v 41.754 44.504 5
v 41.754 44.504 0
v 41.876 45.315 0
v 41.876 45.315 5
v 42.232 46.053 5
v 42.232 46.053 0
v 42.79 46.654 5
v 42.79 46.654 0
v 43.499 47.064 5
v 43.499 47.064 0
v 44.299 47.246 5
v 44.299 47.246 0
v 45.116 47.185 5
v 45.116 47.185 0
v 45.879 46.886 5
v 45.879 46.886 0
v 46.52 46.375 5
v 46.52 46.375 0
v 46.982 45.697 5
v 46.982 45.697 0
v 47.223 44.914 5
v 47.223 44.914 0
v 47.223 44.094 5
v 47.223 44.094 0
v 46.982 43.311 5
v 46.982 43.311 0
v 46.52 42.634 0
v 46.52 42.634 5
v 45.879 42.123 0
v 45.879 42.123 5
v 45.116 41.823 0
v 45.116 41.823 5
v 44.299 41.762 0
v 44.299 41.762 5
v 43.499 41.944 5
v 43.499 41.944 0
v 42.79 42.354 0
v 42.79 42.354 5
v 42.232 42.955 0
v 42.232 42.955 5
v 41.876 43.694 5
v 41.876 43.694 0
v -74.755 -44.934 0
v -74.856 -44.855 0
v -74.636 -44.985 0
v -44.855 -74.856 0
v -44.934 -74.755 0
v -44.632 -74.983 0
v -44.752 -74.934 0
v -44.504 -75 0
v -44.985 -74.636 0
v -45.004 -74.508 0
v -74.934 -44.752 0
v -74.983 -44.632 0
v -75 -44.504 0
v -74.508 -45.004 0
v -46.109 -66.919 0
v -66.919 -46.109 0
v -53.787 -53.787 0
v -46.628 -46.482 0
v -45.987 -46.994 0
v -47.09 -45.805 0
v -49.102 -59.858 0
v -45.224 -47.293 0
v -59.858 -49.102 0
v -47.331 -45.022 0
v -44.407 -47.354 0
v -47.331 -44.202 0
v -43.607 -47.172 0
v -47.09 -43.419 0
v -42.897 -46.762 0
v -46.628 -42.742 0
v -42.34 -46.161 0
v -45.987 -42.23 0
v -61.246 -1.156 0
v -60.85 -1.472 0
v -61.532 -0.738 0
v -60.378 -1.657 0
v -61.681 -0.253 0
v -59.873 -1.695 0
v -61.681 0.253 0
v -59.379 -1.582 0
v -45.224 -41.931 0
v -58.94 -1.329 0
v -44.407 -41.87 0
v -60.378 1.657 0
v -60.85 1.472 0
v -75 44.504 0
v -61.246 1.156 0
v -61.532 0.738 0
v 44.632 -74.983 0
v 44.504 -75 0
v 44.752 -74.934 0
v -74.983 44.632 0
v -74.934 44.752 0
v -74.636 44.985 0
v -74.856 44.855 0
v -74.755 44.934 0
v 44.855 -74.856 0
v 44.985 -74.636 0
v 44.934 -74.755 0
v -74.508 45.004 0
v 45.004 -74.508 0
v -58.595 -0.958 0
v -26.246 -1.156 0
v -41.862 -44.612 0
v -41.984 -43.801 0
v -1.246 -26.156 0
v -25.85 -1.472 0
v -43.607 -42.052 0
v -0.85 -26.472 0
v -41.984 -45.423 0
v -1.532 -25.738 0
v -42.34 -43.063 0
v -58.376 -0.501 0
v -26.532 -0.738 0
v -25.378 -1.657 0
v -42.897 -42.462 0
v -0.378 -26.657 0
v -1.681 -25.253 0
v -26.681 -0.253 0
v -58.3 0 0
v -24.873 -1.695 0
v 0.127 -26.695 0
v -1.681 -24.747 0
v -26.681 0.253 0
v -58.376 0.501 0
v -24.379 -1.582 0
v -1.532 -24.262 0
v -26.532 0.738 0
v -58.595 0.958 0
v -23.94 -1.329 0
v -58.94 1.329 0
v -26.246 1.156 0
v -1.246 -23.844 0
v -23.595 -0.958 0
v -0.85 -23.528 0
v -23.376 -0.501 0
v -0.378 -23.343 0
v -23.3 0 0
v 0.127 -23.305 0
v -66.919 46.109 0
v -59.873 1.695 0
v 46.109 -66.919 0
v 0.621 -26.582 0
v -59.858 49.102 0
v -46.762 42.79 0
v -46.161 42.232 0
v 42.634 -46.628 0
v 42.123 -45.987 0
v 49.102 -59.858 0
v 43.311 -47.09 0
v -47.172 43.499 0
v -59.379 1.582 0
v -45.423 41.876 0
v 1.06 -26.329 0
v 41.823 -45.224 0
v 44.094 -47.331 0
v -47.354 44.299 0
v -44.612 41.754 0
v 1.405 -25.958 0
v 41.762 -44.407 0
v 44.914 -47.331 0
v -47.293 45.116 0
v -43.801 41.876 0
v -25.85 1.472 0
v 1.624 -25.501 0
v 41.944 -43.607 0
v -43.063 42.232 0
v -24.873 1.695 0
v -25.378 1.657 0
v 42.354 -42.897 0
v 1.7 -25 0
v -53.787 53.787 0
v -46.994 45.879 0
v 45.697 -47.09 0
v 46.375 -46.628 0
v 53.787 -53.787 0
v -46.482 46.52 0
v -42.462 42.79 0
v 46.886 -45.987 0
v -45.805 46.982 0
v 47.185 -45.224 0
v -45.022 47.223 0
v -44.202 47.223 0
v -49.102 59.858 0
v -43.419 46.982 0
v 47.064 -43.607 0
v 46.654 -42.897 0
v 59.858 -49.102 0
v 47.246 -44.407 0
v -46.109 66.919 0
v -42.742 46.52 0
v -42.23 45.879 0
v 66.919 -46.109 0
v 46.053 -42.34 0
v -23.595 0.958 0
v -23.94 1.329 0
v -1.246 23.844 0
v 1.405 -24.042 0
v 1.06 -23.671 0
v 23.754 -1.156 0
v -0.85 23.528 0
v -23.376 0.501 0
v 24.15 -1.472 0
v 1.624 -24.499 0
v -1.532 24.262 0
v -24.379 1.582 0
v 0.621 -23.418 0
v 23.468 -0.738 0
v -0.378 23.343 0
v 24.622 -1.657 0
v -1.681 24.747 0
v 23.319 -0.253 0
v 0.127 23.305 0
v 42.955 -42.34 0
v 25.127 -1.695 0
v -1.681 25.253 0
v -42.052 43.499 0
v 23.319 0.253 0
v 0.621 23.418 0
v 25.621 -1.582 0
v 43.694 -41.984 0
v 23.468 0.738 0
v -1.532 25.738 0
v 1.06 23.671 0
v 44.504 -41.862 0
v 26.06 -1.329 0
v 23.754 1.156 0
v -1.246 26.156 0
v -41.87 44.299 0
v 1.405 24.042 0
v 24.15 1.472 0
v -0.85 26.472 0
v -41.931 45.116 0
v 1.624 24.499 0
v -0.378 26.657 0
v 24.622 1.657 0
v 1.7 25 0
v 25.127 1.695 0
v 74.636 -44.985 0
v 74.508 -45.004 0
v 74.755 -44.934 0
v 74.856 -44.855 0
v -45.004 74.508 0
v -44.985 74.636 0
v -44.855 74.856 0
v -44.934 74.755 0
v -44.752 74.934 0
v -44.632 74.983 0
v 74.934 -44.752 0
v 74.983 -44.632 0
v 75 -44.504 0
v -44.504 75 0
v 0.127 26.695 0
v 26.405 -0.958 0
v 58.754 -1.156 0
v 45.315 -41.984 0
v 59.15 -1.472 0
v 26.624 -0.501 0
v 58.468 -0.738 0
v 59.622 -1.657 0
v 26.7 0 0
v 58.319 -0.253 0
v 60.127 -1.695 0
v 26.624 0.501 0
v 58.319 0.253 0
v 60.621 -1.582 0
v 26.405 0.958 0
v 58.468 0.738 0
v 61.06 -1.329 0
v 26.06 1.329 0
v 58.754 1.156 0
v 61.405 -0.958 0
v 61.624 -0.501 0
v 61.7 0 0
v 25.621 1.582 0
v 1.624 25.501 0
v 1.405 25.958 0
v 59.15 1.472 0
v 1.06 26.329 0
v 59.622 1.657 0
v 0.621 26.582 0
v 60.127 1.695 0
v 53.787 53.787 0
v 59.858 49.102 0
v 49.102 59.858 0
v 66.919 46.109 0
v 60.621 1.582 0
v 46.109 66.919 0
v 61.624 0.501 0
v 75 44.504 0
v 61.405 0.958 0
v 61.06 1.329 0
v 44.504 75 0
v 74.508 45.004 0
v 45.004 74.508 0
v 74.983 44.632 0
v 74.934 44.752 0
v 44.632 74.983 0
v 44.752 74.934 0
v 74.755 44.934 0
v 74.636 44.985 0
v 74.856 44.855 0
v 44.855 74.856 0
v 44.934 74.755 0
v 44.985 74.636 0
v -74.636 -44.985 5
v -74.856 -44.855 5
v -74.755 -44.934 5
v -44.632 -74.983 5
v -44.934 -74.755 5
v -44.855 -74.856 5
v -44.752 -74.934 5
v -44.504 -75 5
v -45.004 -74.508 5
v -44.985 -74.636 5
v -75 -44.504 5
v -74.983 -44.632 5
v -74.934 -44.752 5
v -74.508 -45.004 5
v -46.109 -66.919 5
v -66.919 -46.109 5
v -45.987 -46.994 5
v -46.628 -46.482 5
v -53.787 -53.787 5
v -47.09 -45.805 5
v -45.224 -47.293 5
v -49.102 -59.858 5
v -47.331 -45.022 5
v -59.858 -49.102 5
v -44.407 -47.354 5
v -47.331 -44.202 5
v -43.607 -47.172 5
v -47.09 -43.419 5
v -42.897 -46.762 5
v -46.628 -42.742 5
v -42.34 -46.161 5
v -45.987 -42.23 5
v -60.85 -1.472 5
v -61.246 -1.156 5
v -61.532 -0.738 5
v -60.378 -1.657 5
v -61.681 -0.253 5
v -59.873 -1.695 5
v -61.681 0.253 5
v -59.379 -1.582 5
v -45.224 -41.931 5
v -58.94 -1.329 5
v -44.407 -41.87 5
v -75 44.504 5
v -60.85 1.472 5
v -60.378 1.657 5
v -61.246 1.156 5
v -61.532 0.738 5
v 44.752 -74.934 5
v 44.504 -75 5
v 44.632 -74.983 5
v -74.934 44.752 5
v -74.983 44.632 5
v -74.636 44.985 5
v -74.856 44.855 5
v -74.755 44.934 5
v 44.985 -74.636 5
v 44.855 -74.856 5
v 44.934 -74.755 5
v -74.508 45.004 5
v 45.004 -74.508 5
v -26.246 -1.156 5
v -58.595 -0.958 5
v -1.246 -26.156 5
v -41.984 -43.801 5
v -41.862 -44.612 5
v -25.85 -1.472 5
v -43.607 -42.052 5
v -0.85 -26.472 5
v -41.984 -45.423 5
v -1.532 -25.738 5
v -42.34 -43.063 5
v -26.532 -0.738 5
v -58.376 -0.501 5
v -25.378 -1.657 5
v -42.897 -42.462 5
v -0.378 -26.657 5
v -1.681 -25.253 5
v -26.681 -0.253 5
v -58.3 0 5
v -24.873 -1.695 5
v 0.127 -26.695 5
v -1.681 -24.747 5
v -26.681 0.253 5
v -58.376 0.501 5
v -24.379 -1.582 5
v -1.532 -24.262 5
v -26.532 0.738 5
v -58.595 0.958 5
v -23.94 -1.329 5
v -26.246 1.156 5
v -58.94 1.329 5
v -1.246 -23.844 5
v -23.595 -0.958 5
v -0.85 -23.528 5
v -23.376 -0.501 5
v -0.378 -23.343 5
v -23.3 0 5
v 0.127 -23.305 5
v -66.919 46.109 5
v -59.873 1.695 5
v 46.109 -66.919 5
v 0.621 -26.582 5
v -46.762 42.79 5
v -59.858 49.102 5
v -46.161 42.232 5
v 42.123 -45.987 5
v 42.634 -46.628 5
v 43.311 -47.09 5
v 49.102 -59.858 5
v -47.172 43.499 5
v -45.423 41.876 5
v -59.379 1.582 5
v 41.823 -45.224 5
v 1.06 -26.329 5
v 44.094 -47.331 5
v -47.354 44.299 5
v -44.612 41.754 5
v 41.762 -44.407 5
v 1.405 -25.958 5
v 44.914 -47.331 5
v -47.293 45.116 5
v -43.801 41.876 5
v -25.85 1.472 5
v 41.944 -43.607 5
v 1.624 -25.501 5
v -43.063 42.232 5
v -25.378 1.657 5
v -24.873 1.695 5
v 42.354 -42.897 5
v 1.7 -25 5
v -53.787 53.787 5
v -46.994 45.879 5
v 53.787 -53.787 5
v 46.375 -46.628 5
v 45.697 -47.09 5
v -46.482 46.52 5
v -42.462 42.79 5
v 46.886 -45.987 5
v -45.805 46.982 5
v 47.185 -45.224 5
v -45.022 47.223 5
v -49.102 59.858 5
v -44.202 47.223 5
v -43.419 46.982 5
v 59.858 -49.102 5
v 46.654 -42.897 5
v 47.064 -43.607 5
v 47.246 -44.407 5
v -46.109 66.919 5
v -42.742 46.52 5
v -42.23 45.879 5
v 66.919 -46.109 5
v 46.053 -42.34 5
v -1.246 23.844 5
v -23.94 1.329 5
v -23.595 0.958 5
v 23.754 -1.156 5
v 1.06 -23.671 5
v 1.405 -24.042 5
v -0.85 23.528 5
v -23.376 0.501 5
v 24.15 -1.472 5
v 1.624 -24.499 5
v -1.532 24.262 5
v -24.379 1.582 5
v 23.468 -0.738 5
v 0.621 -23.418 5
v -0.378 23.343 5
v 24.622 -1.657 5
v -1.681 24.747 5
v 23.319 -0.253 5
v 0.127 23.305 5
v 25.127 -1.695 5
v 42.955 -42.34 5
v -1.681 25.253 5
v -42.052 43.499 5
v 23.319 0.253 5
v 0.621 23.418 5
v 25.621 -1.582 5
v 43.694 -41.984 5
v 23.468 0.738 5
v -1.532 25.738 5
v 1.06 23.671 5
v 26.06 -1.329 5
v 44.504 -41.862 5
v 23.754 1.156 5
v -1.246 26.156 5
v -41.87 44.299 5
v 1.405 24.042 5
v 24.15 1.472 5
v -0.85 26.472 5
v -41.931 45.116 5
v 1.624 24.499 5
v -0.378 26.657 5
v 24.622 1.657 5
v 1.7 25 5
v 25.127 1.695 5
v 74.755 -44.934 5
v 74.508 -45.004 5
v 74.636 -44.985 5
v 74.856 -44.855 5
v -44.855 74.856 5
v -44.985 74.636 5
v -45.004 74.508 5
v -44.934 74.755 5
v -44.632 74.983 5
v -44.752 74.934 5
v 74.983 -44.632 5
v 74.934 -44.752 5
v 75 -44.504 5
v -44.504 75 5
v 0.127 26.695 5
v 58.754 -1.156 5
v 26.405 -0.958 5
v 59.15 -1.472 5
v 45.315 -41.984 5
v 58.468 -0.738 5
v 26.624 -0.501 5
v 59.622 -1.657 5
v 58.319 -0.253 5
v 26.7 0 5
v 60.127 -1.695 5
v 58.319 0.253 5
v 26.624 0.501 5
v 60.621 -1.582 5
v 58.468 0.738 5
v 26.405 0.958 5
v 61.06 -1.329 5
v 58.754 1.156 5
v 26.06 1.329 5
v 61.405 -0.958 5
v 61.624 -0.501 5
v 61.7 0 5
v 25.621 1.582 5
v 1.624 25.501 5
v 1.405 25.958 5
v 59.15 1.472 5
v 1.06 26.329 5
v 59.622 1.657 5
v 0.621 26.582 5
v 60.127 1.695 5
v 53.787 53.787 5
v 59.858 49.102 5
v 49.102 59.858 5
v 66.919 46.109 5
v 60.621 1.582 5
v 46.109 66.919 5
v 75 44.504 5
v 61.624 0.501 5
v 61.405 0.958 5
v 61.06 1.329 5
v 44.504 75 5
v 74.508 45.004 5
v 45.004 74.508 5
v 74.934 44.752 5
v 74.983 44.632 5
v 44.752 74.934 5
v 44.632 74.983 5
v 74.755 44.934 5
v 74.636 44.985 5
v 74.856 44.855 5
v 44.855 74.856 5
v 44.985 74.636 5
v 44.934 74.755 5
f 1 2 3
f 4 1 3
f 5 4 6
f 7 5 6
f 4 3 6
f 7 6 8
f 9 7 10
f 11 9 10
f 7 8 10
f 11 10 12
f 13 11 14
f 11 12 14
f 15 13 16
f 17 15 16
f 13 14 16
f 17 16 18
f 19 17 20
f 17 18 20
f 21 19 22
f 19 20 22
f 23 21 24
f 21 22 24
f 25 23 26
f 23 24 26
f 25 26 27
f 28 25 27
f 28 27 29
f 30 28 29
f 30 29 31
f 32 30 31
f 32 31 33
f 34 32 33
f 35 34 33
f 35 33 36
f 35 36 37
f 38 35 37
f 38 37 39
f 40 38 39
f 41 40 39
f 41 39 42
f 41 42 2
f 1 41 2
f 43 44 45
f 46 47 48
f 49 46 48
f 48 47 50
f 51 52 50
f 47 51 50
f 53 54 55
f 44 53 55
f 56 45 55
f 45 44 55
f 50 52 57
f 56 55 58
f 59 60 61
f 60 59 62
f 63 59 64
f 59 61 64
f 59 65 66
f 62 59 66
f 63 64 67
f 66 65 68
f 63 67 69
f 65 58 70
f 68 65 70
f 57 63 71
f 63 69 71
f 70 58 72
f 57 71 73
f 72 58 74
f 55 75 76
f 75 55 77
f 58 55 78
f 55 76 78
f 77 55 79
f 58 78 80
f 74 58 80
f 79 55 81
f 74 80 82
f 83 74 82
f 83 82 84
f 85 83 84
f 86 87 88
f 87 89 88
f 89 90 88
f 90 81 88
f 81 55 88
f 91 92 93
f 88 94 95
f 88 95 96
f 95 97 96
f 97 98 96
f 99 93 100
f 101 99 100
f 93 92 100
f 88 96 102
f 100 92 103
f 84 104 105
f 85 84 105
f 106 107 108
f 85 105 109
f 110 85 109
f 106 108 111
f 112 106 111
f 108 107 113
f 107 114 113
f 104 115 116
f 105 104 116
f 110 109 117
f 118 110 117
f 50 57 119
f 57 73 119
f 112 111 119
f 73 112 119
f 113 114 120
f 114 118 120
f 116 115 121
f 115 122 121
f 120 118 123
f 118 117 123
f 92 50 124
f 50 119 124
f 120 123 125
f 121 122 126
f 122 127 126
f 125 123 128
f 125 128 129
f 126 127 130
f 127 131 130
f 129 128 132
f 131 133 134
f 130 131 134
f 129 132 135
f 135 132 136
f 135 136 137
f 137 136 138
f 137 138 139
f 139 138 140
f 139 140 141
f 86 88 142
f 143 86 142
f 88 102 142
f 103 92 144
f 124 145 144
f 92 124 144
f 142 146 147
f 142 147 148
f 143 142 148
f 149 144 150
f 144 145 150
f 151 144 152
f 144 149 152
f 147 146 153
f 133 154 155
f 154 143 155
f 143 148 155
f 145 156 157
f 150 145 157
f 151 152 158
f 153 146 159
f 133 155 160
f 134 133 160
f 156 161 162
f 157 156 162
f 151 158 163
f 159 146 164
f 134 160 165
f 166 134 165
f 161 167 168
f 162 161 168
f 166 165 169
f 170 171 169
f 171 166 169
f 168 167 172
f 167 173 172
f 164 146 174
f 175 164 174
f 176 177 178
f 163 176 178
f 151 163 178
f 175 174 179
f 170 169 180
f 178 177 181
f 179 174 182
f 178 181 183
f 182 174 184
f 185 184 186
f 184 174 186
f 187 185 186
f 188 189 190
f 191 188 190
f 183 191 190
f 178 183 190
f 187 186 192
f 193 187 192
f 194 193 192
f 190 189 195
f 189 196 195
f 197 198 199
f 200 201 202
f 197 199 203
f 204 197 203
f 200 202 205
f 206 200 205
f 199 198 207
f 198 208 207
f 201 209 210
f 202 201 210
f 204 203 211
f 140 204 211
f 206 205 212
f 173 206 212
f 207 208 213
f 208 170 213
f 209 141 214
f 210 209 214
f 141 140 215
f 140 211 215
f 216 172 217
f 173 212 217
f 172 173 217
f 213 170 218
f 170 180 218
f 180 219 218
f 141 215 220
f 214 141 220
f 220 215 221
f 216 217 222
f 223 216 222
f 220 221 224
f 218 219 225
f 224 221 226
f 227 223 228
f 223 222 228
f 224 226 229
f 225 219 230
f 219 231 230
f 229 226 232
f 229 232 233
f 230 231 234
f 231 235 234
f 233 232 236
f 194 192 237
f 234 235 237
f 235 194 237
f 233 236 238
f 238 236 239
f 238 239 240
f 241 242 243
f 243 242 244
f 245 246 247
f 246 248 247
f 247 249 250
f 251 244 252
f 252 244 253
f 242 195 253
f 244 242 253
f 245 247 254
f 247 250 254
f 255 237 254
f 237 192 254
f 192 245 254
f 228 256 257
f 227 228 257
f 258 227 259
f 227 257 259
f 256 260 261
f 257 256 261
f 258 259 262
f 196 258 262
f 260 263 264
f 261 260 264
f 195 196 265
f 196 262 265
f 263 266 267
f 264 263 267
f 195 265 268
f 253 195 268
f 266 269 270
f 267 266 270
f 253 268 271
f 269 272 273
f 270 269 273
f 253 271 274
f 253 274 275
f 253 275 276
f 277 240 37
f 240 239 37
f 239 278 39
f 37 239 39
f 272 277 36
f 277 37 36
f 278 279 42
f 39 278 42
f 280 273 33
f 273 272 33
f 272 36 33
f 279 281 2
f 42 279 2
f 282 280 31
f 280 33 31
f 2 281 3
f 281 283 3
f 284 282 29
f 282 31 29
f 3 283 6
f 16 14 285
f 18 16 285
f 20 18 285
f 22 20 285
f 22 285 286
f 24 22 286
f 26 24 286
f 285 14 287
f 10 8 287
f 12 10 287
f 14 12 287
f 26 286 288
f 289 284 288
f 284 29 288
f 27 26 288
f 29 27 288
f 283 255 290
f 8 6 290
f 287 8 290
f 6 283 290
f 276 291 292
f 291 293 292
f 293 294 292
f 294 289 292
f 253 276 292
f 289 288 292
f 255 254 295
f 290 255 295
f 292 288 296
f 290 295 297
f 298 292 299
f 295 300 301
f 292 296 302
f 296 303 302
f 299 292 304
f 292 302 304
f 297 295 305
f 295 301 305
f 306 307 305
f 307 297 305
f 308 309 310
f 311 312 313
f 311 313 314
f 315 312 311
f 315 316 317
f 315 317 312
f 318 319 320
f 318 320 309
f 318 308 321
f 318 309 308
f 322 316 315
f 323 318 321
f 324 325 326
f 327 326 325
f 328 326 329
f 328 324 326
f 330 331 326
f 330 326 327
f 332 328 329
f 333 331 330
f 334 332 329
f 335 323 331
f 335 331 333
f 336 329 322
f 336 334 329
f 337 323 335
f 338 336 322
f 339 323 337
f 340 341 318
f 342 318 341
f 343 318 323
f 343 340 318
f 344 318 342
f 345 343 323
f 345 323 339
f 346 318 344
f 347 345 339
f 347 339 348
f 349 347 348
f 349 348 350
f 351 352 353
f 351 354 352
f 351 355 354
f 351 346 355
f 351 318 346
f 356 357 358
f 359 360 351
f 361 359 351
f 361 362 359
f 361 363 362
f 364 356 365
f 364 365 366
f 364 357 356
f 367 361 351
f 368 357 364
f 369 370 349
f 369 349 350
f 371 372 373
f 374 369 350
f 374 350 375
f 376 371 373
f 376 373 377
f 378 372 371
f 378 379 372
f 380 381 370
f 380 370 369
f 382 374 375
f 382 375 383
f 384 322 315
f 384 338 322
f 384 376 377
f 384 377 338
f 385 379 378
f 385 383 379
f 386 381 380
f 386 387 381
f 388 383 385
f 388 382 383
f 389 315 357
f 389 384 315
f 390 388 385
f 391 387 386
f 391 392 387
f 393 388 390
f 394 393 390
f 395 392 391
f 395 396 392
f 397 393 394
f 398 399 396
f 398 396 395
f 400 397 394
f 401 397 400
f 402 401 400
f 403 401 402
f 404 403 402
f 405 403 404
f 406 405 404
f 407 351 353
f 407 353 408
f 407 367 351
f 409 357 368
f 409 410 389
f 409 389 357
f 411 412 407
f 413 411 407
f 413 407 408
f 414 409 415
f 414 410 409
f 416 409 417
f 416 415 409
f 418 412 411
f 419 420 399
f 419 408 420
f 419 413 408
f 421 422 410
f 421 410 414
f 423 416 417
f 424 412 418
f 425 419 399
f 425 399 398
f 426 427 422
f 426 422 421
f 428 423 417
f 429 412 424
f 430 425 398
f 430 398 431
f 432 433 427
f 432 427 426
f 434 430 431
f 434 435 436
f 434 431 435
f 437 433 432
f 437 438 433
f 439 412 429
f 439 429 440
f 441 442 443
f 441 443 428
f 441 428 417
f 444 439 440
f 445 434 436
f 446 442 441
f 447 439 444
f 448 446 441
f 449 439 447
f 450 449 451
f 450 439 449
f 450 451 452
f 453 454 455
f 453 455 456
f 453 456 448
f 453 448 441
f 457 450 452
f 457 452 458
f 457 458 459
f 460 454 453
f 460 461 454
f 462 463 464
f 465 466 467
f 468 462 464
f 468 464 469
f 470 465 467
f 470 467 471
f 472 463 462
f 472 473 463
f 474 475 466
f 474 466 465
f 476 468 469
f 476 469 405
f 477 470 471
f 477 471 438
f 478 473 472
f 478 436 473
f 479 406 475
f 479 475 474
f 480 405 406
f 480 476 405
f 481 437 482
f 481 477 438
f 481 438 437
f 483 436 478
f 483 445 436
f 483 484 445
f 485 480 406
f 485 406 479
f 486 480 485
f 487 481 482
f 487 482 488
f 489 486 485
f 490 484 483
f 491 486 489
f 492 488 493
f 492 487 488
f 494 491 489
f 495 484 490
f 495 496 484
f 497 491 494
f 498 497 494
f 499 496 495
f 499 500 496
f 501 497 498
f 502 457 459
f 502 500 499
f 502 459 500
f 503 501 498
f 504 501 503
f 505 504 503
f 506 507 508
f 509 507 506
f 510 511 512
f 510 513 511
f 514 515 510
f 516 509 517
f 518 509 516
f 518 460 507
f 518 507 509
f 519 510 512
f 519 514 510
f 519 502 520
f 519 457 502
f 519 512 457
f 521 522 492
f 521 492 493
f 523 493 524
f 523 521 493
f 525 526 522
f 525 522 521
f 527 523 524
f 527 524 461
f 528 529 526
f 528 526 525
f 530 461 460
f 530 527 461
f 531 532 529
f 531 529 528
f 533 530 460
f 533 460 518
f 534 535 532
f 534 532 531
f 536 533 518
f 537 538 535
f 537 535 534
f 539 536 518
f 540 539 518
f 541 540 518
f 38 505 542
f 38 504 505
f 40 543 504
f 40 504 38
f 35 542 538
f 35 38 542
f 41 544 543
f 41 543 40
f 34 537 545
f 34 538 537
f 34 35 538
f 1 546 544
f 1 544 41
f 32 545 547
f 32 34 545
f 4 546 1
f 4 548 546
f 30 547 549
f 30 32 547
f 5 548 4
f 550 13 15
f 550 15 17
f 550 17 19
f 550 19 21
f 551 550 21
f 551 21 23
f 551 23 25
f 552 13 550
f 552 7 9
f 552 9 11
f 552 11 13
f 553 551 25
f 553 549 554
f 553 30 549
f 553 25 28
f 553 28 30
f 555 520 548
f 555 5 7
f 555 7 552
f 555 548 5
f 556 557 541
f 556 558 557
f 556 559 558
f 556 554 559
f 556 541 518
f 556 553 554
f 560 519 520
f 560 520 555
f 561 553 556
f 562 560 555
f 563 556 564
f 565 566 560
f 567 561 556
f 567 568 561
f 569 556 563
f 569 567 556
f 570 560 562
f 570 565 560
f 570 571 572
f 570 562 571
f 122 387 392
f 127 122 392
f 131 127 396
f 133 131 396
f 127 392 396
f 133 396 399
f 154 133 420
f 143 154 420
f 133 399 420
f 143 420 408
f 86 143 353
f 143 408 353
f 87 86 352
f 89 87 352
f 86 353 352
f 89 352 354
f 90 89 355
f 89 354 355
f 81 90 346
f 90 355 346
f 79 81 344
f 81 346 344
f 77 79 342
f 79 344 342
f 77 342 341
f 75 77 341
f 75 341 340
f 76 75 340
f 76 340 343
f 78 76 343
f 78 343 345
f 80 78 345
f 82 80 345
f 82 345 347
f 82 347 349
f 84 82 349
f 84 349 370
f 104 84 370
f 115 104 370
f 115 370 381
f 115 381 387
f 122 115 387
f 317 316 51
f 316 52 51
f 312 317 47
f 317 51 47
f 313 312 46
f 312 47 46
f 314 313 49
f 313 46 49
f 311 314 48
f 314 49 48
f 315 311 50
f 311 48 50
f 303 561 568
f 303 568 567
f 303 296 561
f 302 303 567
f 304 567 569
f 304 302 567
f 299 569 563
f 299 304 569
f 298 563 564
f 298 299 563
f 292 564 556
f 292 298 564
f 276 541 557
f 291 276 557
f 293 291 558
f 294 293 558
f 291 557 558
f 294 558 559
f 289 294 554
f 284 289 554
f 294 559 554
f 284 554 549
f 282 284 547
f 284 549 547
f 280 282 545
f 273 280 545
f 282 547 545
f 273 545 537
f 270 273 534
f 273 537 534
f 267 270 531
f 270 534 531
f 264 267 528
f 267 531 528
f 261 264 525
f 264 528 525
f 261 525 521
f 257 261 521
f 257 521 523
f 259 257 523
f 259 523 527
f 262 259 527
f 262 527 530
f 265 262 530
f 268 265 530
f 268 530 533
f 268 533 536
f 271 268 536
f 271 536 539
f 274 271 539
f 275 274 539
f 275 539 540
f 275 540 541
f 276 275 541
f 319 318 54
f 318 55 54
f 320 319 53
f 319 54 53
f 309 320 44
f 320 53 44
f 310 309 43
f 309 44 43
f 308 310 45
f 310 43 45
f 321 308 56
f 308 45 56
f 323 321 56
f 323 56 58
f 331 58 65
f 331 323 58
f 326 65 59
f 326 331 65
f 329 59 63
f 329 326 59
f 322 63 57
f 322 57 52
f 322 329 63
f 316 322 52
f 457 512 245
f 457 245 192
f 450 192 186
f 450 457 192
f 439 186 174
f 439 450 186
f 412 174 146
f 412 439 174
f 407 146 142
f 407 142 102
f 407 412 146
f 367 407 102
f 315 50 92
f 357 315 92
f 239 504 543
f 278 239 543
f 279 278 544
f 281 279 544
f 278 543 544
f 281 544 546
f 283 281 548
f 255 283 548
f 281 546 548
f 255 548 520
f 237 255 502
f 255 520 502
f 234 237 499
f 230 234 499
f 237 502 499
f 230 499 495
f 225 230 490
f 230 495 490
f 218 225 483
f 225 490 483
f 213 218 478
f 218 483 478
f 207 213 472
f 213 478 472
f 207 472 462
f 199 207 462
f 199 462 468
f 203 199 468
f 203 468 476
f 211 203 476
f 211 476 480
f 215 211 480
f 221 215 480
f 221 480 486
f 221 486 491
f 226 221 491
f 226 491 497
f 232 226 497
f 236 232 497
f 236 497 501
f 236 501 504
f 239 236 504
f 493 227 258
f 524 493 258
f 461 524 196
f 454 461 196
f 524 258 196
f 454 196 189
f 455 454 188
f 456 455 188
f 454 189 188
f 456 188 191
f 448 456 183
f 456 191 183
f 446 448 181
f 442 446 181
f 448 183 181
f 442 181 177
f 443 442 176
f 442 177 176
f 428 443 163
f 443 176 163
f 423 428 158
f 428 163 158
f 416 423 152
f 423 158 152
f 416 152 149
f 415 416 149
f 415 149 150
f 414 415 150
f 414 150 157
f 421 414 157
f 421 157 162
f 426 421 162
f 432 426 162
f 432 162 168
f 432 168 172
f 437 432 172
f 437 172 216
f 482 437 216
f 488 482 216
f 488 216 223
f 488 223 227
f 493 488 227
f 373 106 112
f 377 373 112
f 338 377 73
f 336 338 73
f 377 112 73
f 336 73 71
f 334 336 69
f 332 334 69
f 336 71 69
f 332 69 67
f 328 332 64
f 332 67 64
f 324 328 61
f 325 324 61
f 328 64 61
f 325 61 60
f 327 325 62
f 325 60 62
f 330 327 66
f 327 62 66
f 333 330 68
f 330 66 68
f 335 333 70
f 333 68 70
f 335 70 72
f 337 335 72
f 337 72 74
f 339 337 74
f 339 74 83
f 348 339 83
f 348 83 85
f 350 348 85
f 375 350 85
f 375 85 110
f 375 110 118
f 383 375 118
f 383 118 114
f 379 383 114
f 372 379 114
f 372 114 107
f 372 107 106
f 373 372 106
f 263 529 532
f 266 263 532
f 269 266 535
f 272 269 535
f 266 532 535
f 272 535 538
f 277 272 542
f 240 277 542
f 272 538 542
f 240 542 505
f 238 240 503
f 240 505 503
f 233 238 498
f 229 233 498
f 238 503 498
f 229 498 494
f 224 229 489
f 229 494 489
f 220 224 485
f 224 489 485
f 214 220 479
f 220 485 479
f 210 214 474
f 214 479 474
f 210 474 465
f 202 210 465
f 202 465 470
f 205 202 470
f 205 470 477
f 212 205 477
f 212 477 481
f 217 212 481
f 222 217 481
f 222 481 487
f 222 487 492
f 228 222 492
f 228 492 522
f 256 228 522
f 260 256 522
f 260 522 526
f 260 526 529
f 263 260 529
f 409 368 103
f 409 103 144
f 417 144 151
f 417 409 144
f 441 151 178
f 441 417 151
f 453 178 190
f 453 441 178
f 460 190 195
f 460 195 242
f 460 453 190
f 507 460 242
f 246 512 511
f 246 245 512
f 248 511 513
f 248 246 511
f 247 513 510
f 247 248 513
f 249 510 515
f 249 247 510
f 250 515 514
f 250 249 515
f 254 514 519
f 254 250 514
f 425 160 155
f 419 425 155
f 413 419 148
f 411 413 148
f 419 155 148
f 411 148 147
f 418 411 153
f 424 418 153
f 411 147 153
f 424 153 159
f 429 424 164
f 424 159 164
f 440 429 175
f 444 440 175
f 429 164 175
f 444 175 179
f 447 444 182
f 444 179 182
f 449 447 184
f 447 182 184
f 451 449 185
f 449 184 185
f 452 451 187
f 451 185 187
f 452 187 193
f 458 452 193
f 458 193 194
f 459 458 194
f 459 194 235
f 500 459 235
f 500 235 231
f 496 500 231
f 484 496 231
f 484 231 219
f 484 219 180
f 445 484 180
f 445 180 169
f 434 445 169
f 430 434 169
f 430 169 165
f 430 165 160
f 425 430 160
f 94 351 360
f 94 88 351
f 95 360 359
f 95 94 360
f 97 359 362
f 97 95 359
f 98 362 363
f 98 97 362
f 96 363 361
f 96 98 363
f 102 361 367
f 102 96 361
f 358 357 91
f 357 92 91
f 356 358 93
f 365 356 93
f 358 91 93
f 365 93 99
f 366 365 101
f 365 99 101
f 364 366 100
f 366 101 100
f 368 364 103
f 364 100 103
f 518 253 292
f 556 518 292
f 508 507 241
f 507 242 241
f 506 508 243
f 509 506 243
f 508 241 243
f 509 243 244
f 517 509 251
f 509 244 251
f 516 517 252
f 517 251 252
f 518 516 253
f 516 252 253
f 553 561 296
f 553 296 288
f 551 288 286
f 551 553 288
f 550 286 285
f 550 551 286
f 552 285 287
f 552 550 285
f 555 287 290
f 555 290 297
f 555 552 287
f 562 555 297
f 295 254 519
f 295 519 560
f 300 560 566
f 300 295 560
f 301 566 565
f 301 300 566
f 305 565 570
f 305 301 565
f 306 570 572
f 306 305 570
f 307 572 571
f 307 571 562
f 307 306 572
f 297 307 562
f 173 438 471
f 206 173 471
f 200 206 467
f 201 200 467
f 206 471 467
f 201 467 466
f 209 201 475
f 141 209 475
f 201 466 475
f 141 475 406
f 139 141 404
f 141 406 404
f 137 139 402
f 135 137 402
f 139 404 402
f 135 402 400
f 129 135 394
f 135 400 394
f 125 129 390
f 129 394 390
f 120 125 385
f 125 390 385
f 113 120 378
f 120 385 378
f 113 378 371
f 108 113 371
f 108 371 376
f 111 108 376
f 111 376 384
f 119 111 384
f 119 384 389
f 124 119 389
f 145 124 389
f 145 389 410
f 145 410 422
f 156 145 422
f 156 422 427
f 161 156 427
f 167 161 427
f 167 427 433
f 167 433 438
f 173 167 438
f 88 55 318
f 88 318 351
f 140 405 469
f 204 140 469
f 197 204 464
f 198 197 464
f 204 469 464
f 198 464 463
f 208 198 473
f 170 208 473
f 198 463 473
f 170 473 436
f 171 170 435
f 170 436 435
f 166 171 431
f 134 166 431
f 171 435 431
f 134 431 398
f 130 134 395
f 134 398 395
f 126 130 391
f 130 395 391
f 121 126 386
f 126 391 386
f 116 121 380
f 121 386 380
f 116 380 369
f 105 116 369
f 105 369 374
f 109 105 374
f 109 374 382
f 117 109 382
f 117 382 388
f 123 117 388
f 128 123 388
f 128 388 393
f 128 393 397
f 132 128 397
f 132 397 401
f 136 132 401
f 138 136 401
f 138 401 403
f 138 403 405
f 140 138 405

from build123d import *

# Parameters (mm, degrees)
ESQUISSE1_W                  = 150
ESQUISSE1_H                  = 150
BOSS_EXTRU_1_DEPTH           = 5
ENL_V_MAT_EXTRU_1_DEPTH      = 5
D_GAGEMENT_M31_D             = 3.4
CONG_1_R                     = 0.5
ENL_V_MAT_EXTRU_2_REACH      = 108.184
ESQUISSE6_R                  = 2.75
R_P_TITION_CIRCULAIRE1_COUNT = 4


with BuildPart() as part:
    # Esquisse1 → Boss.-Extru.1 (new body)
    with BuildSketch(Plane.XY):
        Rectangle(ESQUISSE1_W, ESQUISSE1_H)
    extrude(amount=BOSS_EXTRU_1_DEPTH)

    # Esquisse2 → Enlèv. mat.-Extru.1 (cut)
    with BuildSketch(Plane.XY.offset(5)):
        with BuildLine():
            Line((45, 75), (75, 75))
            Line((75, 75), (75, 45))
            ThreePointArc((75, 45), (53.786796564, 53.786796564), (45, 75))
        make_face()
        with BuildLine():
            Line((75, -75), (45, -75))
            ThreePointArc((45, -75), (53.786796564, -53.786796564), (75, -45))
            Line((75, -45), (75, -75))
        make_face()
        with BuildLine():
            Line((-75, -75), (-75, -45))
            ThreePointArc((-75, -45), (-53.786796564, -53.786796564), (-45, -75))
            Line((-45, -75), (-75, -75))
        make_face()
        with BuildLine():
            Line((-75, 75), (-45, 75))
            ThreePointArc((-45, 75), (-53.786796564, 53.786796564), (-75, 45))
            Line((-75, 45), (-75, 75))
        make_face()
    extrude(amount=-ENL_V_MAT_EXTRU_1_DEPTH, mode=Mode.SUBTRACT)

    # Dégagement M31 (through all)
    with Locations(Plane(origin=(0, 0, 0), x_dir=(-1, 0, 0), z_dir=(0, 0, -1))):
        with Locations((0, 25), (0, -25), (60, 0), (25, 0), (-25, 0), (-60, 0)):
            Hole(D_GAGEMENT_M31_D / 2)

    # Congé1
    cong_1_edges = [part.edges().sort_by_distance(p)[0] for p in [
        (-75, 45, 2.5),
        (-45, 75, 2.5),
        (-45, -75, 2.5),
        (-75, -45, 2.5),
        (75, -45, 2.5),
        (45, -75, 2.5),
        (75, 45, 2.5),
        (45, 75, 2.5),
    ]]
    fillet(cong_1_edges, radius=CONG_1_R)

    # Esquisse6 → Enlèv. mat.-Extru.2 (cut, up to next)
    with BuildSketch(Plane(origin=(0, 0, 0), x_dir=(-1, 0, 0), z_dir=(0, 0, -1)), mode=Mode.PRIVATE) as enl_v_mat_extru_2_sk1:
        with Locations((-44.504098636, 44.504098636)):
            Circle(ESQUISSE6_R)
    enl_v_mat_extru_2_tool1 = extrude(enl_v_mat_extru_2_sk1.sketch, amount=-ENL_V_MAT_EXTRU_2_REACH, mode=Mode.PRIVATE) & part.part
    enl_v_mat_extru_2 = enl_v_mat_extru_2_tool1.solids().sort_by_distance((44.504099, 44.504099, 0))[0]
    add(enl_v_mat_extru_2, mode=Mode.SUBTRACT)

    # Répétition circulaire1: Enlèv. mat.-Extru.2 ×4 about axis
    r_p_tition_circulaire1_axis = Axis((-0.053962748, -0.053962748, 0), (0, 0, 1))
    for i in range(1, R_P_TITION_CIRCULAIRE1_COUNT):
        add(enl_v_mat_extru_2.rotate(r_p_tition_circulaire1_axis, i * 360 / R_P_TITION_CIRCULAIRE1_COUNT), mode=Mode.SUBTRACT)


solid = part.part
